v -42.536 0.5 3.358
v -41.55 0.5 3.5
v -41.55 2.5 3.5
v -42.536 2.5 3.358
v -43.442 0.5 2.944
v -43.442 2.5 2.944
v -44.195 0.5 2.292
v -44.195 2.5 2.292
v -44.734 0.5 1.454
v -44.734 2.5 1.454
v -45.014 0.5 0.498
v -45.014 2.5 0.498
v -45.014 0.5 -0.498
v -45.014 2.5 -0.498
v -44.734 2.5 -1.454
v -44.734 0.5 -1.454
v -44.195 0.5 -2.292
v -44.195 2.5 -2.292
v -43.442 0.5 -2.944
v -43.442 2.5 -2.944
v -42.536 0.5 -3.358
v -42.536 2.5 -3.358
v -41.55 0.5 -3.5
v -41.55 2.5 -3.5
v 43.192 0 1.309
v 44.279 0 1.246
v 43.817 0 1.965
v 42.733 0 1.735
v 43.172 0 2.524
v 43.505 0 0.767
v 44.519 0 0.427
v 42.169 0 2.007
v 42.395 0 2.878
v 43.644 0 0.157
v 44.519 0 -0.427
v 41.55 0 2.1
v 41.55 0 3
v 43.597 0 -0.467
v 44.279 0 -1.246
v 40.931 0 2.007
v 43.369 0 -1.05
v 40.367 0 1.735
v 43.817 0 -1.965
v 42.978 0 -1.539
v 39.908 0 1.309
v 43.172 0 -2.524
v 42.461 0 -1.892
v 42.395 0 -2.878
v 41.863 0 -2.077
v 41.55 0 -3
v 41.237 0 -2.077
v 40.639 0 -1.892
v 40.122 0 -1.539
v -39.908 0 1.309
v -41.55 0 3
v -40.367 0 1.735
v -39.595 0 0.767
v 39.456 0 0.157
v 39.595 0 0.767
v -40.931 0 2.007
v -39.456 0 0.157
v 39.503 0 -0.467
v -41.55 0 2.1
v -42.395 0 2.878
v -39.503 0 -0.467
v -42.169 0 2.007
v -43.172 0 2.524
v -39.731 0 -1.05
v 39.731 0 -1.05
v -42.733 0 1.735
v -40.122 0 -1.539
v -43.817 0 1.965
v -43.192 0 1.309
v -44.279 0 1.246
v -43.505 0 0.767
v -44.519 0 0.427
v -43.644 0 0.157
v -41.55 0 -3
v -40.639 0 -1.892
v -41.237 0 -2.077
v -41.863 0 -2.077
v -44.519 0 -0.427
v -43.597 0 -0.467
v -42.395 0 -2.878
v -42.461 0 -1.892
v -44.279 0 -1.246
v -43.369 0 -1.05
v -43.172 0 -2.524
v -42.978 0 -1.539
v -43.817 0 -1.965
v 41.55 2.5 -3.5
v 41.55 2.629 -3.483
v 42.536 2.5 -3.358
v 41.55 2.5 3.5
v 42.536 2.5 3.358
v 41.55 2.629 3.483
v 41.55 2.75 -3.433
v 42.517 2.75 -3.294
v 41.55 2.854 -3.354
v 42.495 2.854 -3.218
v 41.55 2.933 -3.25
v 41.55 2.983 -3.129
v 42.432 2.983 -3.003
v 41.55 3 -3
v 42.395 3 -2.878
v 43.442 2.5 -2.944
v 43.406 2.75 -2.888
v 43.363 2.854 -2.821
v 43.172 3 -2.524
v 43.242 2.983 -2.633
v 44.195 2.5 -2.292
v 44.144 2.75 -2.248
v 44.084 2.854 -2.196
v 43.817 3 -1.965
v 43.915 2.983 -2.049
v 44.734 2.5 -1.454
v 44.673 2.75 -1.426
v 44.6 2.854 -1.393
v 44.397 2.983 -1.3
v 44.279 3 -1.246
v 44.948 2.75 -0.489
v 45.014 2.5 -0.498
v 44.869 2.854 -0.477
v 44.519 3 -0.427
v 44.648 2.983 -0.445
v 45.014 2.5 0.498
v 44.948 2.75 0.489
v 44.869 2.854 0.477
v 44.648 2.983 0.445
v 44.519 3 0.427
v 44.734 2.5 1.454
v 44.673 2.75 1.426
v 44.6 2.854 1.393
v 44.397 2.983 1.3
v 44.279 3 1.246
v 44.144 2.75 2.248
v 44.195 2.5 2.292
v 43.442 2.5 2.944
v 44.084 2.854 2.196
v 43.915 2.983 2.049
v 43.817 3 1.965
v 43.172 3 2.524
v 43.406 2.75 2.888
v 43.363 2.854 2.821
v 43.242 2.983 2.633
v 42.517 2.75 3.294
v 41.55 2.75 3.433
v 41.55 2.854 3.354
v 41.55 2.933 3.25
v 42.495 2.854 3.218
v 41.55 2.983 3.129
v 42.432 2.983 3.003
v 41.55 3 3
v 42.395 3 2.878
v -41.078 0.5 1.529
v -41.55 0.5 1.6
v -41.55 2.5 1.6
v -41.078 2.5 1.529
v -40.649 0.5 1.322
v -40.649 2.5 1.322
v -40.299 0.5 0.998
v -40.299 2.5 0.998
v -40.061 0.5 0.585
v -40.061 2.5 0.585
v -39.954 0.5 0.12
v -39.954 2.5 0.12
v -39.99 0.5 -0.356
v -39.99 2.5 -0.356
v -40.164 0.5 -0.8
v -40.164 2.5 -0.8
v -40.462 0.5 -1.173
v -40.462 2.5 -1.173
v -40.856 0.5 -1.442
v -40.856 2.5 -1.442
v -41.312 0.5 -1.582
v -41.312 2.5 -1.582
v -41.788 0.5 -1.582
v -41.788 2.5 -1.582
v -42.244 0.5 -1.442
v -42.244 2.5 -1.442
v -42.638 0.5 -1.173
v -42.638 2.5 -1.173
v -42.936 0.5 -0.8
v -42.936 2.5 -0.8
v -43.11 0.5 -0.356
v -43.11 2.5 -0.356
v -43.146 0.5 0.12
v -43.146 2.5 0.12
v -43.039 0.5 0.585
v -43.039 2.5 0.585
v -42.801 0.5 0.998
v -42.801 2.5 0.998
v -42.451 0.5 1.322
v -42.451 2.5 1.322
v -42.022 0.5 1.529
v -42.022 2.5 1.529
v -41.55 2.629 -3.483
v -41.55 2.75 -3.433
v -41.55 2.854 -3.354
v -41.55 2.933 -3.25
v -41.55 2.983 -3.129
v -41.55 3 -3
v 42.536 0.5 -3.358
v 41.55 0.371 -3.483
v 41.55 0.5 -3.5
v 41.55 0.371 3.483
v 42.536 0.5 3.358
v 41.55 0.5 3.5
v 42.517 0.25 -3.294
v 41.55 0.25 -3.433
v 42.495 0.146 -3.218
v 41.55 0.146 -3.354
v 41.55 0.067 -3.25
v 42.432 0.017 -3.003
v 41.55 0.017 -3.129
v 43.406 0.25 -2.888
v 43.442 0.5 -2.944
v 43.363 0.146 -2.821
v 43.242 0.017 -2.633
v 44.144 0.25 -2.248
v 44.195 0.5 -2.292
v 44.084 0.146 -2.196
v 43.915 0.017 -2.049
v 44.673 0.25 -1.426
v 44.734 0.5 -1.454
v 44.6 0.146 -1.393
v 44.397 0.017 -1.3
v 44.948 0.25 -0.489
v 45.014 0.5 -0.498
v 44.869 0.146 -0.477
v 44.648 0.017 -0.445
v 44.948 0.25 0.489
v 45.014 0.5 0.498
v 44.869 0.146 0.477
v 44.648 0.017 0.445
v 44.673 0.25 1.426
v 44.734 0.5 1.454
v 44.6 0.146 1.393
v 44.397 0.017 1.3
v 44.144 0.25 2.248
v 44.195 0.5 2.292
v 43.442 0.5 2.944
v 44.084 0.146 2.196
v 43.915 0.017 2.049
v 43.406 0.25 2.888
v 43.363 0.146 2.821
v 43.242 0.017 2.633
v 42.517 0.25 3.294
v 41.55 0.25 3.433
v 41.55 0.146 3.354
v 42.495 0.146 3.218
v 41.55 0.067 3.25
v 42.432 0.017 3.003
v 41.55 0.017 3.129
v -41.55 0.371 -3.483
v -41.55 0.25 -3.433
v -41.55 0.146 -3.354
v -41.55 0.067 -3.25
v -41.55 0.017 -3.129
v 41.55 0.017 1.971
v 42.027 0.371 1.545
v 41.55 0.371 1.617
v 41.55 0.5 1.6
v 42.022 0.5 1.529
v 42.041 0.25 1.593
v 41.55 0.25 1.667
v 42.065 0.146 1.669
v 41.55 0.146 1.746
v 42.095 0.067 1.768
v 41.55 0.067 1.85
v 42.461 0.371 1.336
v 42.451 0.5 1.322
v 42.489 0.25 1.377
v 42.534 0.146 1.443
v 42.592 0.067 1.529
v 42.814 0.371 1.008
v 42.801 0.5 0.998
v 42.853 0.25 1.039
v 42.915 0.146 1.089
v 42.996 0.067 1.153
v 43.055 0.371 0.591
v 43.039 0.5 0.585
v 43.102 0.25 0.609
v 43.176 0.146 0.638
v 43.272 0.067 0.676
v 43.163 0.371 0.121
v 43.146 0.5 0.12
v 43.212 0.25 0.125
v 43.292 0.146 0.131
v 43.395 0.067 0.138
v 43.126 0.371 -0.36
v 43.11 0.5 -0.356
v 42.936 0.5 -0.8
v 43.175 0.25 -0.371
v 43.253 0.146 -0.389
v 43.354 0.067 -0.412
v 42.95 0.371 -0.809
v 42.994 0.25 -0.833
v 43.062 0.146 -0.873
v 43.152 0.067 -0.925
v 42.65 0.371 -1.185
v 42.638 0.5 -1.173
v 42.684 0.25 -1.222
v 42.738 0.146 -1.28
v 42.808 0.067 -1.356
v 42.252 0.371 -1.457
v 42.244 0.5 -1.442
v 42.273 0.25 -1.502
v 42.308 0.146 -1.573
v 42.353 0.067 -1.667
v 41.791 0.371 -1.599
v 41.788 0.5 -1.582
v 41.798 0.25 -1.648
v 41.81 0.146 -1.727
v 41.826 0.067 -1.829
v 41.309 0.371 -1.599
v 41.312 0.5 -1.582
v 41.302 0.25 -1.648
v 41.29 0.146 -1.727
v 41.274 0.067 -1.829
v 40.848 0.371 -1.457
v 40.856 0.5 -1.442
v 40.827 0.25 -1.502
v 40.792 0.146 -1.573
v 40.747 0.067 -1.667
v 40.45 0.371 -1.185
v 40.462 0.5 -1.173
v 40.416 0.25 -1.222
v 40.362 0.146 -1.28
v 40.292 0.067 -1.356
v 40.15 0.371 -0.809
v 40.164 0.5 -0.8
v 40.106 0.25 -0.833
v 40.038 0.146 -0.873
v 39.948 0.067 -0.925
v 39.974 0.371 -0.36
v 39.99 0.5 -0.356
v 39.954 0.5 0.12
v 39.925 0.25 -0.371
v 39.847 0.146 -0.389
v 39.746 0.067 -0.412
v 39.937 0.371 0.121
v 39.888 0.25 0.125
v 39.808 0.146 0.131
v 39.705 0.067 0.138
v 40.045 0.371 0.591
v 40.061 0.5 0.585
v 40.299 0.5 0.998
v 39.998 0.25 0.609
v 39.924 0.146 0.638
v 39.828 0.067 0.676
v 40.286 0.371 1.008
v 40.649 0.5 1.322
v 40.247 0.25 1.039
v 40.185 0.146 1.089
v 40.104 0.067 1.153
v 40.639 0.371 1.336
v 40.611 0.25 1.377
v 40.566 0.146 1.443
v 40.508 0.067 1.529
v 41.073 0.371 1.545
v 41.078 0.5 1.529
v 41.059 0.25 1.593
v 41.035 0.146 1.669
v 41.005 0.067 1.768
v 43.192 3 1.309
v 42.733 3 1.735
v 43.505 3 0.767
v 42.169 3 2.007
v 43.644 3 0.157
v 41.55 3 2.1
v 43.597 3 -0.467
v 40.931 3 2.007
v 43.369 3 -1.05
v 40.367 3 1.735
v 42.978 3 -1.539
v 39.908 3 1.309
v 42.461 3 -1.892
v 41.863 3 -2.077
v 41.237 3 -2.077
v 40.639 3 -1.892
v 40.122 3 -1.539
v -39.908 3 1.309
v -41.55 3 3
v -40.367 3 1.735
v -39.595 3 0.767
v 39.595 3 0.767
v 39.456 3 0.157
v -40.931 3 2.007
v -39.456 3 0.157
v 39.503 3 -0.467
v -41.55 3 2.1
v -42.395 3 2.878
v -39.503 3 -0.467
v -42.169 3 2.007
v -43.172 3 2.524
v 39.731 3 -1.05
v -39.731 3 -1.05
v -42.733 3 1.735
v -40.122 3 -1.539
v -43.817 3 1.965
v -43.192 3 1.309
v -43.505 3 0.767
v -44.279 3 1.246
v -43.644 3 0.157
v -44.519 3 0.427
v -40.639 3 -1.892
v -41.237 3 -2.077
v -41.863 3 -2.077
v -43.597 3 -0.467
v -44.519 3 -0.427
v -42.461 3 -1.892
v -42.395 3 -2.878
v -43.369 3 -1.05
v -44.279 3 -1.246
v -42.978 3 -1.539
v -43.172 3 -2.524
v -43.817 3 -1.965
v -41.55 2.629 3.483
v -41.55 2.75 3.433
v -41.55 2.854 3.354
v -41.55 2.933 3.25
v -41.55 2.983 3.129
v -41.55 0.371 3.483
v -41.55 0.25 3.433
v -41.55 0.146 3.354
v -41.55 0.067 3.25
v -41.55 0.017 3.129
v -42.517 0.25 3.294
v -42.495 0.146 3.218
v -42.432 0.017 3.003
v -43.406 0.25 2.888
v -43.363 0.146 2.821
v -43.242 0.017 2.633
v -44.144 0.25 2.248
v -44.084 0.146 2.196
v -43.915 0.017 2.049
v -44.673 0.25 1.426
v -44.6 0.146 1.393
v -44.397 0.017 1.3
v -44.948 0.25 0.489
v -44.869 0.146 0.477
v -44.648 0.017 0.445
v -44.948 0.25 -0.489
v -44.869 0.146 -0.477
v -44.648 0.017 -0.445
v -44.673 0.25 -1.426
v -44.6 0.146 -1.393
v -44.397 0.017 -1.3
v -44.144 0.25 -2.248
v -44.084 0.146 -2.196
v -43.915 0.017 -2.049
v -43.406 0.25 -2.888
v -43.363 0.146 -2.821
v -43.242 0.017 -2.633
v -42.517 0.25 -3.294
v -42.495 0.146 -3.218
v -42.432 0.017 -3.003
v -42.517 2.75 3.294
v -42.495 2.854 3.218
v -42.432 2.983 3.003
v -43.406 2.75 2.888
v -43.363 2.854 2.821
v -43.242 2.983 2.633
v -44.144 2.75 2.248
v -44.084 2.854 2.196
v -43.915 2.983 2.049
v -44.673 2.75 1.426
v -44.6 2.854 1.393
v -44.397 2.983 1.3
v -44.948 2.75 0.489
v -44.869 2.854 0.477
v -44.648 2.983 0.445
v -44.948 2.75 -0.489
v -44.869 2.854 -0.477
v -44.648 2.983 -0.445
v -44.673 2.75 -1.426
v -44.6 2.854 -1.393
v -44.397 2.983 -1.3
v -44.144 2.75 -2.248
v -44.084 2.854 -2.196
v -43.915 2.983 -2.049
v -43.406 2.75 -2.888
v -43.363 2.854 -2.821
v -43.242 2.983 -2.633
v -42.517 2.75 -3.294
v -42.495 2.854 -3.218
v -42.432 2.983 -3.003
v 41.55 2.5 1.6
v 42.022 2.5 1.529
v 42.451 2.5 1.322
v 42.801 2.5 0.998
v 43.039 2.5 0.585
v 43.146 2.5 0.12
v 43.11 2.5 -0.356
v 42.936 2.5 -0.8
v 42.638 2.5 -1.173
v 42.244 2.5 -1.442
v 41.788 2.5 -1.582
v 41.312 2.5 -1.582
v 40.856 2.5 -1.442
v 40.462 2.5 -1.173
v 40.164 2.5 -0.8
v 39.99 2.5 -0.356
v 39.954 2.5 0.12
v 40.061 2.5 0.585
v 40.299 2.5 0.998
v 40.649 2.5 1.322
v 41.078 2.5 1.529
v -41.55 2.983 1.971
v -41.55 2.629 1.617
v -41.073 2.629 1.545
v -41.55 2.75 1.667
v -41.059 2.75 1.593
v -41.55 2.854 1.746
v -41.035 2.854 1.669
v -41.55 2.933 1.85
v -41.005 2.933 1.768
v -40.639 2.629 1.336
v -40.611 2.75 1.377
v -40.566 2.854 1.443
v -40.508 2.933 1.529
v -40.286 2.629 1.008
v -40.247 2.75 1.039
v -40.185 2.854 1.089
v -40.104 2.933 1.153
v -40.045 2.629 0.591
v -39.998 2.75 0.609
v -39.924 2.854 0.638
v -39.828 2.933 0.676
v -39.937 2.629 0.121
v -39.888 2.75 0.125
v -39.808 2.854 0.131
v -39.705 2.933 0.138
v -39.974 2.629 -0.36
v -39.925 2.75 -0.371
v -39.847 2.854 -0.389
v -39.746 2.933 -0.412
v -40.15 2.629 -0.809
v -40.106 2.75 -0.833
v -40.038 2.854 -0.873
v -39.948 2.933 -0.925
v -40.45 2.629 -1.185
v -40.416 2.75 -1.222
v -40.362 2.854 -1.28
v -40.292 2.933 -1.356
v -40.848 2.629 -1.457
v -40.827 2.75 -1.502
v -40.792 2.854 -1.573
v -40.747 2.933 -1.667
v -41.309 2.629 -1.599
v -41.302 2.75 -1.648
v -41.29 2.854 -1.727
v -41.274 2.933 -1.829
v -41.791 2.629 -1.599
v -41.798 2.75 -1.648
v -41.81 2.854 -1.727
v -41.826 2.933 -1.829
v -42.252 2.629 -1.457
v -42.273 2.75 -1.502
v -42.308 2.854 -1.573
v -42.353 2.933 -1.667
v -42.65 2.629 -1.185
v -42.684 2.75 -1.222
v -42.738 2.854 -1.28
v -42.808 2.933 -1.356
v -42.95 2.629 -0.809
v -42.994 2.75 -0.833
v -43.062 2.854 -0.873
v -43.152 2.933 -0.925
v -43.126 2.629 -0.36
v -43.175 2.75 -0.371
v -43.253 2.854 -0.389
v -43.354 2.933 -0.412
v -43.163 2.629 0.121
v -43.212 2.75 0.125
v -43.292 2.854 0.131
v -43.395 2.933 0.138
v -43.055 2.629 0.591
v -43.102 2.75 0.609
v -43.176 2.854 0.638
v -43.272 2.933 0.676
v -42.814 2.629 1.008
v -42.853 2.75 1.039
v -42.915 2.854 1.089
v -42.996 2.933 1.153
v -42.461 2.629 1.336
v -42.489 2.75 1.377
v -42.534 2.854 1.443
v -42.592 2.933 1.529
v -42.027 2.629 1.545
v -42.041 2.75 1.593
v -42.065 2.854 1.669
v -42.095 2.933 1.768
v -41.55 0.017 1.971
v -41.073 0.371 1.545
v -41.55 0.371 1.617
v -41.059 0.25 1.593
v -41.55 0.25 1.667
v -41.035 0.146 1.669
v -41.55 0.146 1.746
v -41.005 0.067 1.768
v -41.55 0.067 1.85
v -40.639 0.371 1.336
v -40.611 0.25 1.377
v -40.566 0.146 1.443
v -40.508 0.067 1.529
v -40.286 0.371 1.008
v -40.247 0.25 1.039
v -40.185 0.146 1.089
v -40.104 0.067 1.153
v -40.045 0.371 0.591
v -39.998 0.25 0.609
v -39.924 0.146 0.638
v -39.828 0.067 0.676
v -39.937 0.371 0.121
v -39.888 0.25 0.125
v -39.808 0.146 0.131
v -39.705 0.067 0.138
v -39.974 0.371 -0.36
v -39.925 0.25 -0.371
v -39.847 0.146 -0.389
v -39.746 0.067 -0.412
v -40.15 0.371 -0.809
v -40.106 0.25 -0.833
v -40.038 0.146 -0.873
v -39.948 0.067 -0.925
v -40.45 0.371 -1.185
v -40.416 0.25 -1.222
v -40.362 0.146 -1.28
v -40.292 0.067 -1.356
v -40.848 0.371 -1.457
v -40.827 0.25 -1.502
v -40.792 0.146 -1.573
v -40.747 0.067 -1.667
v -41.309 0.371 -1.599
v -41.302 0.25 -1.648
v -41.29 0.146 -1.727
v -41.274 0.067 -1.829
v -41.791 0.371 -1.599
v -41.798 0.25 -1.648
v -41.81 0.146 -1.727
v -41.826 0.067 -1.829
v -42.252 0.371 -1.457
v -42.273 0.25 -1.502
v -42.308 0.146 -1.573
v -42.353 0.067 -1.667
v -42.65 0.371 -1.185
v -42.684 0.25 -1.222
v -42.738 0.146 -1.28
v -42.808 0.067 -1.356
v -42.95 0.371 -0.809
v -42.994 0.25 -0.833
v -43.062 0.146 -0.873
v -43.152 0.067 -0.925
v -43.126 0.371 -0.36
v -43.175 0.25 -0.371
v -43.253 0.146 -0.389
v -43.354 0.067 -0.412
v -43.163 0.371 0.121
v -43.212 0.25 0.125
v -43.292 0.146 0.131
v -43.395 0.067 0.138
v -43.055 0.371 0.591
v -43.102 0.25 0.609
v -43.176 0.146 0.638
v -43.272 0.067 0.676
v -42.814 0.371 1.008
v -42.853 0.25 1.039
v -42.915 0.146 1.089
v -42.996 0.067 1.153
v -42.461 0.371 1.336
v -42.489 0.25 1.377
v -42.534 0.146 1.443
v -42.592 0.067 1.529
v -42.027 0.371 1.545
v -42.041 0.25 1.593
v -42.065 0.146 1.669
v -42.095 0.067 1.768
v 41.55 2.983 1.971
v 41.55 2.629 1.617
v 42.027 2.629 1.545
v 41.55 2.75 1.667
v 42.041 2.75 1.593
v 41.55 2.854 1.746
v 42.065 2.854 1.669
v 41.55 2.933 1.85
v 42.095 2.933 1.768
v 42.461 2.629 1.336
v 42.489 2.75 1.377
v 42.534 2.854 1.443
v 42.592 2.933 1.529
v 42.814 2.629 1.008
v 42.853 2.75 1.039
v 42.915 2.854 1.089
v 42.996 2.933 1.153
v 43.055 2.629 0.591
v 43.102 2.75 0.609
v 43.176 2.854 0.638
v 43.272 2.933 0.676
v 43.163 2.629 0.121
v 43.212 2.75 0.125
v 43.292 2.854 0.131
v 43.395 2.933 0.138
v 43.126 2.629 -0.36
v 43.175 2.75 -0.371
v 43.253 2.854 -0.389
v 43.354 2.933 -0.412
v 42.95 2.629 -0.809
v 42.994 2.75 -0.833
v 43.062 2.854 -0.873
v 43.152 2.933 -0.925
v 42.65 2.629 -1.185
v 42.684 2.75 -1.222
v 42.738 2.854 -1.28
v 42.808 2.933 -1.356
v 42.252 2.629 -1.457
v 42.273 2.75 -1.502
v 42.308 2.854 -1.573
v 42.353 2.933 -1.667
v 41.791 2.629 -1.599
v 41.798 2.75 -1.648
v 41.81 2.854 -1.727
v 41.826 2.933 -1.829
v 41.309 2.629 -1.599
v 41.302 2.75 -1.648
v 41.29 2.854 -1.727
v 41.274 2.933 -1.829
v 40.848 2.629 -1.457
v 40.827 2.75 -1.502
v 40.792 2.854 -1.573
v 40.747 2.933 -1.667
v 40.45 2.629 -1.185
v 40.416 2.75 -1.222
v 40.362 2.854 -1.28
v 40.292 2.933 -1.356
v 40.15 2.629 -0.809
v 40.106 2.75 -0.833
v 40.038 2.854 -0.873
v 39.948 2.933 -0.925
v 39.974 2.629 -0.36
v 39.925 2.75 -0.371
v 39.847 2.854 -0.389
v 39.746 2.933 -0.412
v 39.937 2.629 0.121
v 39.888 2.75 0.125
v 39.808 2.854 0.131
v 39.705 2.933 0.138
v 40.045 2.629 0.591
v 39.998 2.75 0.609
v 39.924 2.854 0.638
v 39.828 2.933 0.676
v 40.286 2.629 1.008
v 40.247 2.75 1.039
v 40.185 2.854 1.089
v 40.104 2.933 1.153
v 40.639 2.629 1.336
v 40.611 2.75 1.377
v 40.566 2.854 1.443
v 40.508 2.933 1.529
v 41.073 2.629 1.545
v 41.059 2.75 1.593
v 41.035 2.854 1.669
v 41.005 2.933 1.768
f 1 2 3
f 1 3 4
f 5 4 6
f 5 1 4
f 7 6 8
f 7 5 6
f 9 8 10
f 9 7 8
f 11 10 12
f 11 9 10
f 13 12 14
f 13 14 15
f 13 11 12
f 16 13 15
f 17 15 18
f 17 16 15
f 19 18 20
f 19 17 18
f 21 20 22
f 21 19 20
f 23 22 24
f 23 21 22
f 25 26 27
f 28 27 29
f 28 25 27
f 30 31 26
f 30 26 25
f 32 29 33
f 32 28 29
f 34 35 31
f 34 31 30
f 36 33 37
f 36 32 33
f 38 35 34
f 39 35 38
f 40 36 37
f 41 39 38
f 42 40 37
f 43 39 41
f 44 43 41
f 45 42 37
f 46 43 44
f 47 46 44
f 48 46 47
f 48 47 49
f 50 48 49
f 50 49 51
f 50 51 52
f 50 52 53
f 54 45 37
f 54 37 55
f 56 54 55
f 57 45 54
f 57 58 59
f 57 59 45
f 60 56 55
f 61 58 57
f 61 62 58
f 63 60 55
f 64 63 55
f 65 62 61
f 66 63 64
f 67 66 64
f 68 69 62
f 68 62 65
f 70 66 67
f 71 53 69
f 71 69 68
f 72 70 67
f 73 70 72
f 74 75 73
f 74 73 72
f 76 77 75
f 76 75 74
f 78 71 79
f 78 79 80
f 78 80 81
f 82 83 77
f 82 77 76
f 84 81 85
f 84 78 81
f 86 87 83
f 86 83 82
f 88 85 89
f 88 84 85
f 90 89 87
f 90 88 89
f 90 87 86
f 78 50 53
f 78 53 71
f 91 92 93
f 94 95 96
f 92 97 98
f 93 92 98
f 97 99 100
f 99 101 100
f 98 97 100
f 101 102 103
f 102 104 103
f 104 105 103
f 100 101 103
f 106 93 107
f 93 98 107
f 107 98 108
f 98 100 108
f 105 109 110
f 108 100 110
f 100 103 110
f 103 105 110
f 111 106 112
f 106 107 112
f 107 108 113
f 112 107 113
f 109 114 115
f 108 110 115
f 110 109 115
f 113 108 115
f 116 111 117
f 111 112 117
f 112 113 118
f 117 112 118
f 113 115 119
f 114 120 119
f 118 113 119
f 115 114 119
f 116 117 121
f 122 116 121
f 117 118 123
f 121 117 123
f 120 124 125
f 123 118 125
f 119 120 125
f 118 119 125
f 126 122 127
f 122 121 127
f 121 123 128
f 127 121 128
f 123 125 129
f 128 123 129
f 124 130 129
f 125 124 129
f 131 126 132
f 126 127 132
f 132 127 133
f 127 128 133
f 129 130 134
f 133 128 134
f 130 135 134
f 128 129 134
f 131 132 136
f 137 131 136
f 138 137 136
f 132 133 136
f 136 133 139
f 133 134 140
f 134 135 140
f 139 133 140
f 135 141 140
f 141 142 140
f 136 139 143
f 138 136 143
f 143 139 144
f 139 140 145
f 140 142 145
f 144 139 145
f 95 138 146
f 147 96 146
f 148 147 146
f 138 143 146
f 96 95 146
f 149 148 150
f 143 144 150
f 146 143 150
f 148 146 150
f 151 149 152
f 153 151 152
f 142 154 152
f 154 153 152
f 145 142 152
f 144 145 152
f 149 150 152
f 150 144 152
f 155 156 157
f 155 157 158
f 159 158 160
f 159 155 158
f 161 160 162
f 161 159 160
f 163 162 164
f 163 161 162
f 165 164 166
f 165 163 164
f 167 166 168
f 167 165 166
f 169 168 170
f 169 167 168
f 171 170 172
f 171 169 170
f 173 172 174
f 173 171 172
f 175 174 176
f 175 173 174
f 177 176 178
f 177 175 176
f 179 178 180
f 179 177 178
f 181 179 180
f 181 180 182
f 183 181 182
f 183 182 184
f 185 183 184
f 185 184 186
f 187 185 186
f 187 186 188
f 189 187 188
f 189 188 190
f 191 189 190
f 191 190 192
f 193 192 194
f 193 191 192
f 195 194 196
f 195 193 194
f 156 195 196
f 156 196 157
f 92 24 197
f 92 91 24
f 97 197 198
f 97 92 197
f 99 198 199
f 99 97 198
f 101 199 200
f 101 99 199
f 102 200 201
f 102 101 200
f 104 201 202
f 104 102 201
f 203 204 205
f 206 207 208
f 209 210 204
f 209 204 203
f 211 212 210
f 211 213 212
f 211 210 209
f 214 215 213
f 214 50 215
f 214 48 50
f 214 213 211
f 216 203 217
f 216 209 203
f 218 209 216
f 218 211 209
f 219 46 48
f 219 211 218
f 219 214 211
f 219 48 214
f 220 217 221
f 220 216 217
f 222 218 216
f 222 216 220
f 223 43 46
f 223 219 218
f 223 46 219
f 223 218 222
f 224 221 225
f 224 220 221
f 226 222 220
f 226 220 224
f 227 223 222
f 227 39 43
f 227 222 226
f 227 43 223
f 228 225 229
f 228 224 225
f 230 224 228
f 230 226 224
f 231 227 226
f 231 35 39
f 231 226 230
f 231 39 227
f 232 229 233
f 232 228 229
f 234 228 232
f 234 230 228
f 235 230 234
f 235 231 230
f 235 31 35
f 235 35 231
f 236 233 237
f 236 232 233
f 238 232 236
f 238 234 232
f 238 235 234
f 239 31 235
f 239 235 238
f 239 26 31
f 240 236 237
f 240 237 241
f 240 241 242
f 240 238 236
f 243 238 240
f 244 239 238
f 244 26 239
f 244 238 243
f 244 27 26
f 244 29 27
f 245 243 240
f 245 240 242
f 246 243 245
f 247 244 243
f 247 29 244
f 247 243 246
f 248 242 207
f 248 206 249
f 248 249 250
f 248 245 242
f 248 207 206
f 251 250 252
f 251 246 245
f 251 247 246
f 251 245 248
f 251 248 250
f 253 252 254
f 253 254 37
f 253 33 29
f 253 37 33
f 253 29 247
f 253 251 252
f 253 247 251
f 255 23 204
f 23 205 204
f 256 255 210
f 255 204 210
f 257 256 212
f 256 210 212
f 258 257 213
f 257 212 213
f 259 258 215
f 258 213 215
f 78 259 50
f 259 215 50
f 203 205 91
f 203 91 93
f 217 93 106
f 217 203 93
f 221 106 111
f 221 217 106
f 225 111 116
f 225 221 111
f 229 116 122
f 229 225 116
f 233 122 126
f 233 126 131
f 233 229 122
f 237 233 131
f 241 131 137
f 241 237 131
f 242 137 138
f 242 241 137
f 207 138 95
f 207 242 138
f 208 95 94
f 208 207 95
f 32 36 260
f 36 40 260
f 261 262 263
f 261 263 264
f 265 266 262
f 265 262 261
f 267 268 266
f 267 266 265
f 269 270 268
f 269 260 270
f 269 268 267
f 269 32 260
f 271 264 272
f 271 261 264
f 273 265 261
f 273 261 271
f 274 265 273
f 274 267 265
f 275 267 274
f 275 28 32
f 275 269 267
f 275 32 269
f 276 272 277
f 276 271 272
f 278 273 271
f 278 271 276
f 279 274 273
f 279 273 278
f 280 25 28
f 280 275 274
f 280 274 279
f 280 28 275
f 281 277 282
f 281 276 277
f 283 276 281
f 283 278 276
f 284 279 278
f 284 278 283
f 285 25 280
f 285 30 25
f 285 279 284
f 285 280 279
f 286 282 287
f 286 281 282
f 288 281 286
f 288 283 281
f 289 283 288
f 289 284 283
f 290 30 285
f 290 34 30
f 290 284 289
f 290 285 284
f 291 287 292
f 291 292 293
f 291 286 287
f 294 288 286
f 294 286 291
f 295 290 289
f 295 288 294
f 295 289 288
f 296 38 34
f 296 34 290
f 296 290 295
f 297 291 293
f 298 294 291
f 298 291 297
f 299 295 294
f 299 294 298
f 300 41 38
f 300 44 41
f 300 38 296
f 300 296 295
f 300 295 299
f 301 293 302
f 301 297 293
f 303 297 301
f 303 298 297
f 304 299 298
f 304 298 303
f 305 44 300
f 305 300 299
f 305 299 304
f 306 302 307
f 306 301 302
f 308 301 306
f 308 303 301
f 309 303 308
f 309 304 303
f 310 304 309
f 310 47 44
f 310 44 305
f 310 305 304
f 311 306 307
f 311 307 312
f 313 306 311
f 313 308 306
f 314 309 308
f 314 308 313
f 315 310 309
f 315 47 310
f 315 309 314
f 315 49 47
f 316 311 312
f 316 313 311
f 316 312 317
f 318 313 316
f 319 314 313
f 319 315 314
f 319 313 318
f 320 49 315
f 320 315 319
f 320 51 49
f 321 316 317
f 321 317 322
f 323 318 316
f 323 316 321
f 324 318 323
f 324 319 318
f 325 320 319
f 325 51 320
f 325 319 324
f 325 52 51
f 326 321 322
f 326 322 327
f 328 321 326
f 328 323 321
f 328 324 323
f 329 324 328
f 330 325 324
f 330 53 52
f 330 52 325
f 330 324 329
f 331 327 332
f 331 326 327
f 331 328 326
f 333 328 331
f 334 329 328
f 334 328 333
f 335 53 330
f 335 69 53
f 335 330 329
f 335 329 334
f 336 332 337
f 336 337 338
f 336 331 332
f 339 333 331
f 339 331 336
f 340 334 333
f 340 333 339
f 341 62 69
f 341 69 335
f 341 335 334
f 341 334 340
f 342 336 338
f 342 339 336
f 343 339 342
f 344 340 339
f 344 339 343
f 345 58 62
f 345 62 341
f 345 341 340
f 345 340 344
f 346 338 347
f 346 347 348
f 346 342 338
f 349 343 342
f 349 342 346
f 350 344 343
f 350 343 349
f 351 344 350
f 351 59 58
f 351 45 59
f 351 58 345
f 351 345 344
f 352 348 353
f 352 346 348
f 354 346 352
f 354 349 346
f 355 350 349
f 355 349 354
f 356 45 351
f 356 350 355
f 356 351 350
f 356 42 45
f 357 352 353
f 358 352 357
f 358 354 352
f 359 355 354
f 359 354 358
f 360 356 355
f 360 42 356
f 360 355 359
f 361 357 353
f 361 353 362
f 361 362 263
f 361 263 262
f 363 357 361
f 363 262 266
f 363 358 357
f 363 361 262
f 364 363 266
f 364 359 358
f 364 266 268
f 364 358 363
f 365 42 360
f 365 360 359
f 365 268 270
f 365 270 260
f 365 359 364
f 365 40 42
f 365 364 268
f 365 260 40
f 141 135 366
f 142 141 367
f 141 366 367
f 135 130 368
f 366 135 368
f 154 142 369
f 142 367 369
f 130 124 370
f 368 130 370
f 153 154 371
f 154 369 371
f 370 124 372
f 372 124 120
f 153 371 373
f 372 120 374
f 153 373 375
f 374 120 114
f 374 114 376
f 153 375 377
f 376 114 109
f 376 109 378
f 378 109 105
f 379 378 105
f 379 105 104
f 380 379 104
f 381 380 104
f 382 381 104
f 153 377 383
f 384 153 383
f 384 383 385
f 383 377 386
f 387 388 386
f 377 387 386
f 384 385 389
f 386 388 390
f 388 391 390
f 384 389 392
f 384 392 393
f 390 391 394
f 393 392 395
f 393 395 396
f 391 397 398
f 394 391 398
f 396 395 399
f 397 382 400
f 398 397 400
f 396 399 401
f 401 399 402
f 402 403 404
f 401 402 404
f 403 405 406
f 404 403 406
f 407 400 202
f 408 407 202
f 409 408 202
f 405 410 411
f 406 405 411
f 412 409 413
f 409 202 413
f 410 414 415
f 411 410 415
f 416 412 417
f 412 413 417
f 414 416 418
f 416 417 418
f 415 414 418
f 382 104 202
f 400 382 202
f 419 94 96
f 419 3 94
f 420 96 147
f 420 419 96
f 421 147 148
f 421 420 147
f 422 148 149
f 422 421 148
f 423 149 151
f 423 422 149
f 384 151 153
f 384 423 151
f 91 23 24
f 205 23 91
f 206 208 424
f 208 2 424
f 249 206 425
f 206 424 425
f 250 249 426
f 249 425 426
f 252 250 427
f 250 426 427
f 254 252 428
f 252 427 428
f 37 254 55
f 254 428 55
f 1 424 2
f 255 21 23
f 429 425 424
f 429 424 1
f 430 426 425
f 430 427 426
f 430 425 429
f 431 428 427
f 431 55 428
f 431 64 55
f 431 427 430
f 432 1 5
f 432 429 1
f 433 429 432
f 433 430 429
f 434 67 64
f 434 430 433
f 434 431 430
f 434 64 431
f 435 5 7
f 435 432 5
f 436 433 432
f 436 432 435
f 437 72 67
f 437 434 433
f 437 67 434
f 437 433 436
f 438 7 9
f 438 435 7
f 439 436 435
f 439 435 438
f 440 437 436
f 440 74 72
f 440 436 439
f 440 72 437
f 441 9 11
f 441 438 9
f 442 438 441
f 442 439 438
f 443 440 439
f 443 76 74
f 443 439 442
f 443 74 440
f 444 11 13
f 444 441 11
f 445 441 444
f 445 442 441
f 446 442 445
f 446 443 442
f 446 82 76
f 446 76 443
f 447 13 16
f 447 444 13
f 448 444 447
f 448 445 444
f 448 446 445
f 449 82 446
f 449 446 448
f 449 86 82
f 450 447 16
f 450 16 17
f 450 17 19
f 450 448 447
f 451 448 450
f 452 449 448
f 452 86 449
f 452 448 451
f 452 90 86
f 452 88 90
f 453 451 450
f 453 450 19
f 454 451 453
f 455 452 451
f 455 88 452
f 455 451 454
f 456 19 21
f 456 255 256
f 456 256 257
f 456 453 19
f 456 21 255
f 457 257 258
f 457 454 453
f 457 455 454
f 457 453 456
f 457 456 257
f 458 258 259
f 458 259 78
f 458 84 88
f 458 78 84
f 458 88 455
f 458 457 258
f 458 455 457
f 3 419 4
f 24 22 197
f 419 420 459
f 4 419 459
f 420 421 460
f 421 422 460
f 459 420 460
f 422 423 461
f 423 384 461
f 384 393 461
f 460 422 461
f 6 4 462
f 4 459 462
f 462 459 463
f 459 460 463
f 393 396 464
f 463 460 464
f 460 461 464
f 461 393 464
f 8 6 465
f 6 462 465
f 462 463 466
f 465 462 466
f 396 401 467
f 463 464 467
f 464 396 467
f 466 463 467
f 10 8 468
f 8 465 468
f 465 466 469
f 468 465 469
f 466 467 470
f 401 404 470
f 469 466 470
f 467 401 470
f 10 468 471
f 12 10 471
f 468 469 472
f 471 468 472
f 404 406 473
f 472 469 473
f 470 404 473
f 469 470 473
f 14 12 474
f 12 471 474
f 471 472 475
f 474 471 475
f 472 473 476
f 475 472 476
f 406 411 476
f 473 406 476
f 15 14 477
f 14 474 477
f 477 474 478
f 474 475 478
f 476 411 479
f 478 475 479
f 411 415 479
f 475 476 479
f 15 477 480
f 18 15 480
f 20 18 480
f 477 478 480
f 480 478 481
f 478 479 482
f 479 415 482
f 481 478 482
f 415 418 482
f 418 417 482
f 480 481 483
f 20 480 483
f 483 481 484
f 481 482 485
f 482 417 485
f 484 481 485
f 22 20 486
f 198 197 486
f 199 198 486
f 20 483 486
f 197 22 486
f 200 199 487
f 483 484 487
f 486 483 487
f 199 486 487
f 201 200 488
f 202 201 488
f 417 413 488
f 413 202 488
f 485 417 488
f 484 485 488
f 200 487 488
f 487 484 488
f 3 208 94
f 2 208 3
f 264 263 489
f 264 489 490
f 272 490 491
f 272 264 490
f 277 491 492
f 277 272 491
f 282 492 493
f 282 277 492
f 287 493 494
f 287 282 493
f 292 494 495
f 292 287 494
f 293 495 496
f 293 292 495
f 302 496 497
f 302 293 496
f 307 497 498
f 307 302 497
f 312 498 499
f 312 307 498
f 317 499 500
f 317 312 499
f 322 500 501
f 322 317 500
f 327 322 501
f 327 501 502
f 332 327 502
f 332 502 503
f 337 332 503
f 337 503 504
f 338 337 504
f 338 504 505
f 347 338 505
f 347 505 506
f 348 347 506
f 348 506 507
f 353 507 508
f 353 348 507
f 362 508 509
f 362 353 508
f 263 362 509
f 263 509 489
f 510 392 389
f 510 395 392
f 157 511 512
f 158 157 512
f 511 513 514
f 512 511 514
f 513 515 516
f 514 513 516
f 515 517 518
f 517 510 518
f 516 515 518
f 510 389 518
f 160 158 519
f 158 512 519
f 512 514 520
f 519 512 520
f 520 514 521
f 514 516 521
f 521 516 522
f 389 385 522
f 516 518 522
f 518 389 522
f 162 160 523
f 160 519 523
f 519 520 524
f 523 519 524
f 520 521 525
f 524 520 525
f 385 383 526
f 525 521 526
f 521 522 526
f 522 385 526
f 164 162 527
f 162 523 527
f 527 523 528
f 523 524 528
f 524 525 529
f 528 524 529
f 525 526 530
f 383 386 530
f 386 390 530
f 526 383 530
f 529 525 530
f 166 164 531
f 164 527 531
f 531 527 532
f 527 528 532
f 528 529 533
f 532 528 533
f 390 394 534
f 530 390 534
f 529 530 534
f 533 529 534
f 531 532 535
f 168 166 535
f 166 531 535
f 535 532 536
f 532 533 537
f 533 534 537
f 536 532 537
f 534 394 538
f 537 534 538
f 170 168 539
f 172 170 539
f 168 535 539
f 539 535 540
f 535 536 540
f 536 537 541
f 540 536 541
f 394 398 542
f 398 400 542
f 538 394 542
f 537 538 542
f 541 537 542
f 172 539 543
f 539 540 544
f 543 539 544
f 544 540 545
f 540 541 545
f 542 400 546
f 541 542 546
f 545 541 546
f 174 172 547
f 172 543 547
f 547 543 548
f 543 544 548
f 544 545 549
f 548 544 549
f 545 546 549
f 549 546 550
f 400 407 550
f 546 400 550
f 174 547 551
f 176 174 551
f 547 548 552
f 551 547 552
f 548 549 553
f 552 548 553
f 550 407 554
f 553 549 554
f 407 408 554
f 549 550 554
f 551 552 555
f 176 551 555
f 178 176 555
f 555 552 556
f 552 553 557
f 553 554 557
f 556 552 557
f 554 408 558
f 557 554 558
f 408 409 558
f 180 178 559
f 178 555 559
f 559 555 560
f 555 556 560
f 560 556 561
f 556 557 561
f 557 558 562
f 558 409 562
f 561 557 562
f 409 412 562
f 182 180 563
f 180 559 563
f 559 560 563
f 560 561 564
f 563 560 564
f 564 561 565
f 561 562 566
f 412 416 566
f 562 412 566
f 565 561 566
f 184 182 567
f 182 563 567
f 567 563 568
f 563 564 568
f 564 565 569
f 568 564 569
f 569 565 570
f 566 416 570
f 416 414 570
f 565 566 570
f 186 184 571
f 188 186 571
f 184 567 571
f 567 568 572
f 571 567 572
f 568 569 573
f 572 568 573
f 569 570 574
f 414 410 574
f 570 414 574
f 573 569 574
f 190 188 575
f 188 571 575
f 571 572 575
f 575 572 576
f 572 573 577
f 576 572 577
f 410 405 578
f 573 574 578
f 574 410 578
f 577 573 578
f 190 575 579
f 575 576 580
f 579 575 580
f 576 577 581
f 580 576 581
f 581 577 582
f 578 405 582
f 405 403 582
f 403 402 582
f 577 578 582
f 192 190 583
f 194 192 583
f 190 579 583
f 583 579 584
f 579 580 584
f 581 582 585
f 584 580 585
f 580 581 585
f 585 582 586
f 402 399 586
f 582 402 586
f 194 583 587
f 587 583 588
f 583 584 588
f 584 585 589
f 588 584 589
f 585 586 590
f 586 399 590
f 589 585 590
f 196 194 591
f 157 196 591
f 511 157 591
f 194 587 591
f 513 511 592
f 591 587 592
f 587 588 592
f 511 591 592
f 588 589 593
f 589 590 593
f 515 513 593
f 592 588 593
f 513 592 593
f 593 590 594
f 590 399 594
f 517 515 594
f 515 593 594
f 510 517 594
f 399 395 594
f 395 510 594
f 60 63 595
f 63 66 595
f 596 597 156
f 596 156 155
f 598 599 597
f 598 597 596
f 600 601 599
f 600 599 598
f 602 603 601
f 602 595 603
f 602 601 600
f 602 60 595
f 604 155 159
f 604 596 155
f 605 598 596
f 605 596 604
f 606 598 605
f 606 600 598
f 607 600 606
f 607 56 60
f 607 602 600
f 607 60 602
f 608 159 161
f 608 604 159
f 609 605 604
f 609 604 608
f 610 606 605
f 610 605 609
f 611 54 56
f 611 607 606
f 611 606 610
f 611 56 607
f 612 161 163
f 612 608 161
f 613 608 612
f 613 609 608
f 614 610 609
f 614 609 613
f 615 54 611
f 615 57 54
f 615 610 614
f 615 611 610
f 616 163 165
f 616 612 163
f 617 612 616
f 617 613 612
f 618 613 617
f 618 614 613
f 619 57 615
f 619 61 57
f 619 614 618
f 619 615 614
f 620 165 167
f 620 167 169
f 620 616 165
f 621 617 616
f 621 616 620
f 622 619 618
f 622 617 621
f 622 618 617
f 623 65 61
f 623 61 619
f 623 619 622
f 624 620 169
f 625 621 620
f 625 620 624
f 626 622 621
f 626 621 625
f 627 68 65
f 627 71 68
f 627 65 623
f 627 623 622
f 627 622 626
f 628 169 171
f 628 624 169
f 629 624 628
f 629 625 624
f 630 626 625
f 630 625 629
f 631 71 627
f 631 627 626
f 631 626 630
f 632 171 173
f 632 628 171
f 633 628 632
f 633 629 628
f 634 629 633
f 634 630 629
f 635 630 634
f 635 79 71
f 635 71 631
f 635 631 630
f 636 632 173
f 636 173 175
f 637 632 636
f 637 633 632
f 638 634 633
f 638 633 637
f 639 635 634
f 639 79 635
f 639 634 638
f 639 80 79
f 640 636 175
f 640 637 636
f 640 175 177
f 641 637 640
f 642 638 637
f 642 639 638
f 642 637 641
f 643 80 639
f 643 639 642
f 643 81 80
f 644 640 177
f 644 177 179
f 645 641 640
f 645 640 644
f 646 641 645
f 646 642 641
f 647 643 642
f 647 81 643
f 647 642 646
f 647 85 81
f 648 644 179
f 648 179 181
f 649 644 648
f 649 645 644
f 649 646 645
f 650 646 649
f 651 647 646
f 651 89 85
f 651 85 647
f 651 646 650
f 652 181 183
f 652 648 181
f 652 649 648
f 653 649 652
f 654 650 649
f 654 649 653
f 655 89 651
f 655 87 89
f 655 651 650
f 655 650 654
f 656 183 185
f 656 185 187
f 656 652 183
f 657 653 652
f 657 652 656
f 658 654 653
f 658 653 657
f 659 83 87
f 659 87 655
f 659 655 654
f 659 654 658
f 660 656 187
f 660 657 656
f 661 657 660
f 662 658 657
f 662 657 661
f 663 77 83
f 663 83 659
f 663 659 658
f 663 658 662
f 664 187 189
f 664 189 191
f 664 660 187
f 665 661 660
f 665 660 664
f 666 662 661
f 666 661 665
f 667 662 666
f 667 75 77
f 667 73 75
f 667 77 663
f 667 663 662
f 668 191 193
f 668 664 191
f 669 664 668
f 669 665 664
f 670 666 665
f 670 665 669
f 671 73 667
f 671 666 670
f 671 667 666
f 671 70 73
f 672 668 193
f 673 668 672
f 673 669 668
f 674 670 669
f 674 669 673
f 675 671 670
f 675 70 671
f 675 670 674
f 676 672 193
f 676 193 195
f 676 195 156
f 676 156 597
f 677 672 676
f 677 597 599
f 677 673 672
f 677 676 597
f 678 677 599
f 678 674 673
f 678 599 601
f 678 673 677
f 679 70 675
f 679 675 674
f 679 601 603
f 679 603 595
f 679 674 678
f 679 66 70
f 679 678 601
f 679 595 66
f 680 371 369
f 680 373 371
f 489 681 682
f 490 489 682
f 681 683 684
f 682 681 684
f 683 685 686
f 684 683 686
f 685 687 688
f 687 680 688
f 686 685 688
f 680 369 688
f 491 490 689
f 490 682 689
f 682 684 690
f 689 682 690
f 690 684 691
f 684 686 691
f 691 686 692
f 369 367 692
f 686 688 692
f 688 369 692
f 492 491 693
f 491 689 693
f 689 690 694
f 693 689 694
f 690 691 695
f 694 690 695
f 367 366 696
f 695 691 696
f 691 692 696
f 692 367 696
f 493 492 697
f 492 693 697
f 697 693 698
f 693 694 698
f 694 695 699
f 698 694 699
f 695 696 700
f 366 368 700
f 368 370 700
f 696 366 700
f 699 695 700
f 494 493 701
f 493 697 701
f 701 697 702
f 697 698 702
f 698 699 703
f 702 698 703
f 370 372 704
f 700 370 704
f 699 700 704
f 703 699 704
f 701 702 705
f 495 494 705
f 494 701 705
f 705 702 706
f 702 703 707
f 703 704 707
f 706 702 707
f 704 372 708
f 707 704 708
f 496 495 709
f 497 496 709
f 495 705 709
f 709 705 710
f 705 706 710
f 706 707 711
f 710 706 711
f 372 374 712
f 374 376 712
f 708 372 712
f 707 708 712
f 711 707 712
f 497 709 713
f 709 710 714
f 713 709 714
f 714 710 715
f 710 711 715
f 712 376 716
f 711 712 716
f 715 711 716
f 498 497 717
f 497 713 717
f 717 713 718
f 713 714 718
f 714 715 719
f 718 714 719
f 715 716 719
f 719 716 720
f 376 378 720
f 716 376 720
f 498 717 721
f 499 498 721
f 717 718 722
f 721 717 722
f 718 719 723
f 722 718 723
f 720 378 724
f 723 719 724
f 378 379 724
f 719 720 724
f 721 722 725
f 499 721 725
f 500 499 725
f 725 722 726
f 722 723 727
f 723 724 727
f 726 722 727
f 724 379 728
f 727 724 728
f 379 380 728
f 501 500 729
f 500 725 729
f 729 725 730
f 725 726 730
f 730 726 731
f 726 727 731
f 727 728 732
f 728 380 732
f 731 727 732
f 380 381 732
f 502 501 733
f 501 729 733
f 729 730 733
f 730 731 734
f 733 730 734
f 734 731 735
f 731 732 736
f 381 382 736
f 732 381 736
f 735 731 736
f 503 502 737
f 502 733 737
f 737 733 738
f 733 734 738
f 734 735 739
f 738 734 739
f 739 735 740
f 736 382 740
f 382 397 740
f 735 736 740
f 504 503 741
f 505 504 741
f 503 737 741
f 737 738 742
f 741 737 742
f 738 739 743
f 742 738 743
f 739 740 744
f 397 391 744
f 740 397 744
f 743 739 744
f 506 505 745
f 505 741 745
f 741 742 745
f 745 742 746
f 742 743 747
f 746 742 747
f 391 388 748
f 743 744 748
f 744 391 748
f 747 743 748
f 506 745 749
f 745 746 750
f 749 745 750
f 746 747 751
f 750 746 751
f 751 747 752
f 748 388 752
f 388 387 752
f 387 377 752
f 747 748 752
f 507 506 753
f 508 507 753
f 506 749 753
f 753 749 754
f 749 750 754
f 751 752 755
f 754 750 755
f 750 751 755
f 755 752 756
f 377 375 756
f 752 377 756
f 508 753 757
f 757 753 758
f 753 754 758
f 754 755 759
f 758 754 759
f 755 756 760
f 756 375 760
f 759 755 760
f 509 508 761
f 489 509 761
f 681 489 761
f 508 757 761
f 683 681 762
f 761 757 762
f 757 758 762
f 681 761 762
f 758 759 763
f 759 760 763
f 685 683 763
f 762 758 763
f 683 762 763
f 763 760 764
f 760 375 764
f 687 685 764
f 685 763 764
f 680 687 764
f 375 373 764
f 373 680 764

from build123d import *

# Parameters (mm, degrees)
SKETCH1_R           = 1.6
BOSS_EXTRUDE1_DEPTH = 3
FILLET1_R           = 0.5


with BuildPart() as part:
    # Sketch1 → Boss-Extrude1 (new body)
    with BuildSketch(Plane(origin=(0, 0, 0), x_dir=(1, 0, 0), z_dir=(0, 1, 0))):
        with BuildLine():
            Line((-41.55, 3.5), (41.55, 3.5))
            ThreePointArc((41.55, 3.5), (45.05, 0), (41.55, -3.5))
            Line((41.55, -3.5), (-41.55, -3.5))
            ThreePointArc((-41.55, -3.5), (-45.05, 0), (-41.55, 3.5))
        make_face()
        with Locations(Location((41.55, 0, 0), (0, 0, 270))):
            Circle(SKETCH1_R, mode=Mode.SUBTRACT)
        with Locations(Location((-41.55, 0, 0), (0, 0, 270))):
            Circle(SKETCH1_R, mode=Mode.SUBTRACT)
    extrude(amount=BOSS_EXTRUDE1_DEPTH)

    # Fillet1
    fillet1_edges = [part.edges().sort_by_distance(p)[0] for p in [
        (41.55, 0, -1.6),
        (41.55, 3, -1.6),
        (45.05, 3, 0),
        (-41.55, 0, -1.6),
        (-41.55, 3, -1.6),
        (0, 3, -3.5),
        (-45.05, 3, 0),
        (0, 0, -3.5),
        (45.05, 0, 0),
        (0, 0, 3.5),
        (-45.05, 0, 0),
        (0, 3, 3.5),
    ]]
    fillet(fillet1_edges, radius=FILLET1_R)


solid = part.part
